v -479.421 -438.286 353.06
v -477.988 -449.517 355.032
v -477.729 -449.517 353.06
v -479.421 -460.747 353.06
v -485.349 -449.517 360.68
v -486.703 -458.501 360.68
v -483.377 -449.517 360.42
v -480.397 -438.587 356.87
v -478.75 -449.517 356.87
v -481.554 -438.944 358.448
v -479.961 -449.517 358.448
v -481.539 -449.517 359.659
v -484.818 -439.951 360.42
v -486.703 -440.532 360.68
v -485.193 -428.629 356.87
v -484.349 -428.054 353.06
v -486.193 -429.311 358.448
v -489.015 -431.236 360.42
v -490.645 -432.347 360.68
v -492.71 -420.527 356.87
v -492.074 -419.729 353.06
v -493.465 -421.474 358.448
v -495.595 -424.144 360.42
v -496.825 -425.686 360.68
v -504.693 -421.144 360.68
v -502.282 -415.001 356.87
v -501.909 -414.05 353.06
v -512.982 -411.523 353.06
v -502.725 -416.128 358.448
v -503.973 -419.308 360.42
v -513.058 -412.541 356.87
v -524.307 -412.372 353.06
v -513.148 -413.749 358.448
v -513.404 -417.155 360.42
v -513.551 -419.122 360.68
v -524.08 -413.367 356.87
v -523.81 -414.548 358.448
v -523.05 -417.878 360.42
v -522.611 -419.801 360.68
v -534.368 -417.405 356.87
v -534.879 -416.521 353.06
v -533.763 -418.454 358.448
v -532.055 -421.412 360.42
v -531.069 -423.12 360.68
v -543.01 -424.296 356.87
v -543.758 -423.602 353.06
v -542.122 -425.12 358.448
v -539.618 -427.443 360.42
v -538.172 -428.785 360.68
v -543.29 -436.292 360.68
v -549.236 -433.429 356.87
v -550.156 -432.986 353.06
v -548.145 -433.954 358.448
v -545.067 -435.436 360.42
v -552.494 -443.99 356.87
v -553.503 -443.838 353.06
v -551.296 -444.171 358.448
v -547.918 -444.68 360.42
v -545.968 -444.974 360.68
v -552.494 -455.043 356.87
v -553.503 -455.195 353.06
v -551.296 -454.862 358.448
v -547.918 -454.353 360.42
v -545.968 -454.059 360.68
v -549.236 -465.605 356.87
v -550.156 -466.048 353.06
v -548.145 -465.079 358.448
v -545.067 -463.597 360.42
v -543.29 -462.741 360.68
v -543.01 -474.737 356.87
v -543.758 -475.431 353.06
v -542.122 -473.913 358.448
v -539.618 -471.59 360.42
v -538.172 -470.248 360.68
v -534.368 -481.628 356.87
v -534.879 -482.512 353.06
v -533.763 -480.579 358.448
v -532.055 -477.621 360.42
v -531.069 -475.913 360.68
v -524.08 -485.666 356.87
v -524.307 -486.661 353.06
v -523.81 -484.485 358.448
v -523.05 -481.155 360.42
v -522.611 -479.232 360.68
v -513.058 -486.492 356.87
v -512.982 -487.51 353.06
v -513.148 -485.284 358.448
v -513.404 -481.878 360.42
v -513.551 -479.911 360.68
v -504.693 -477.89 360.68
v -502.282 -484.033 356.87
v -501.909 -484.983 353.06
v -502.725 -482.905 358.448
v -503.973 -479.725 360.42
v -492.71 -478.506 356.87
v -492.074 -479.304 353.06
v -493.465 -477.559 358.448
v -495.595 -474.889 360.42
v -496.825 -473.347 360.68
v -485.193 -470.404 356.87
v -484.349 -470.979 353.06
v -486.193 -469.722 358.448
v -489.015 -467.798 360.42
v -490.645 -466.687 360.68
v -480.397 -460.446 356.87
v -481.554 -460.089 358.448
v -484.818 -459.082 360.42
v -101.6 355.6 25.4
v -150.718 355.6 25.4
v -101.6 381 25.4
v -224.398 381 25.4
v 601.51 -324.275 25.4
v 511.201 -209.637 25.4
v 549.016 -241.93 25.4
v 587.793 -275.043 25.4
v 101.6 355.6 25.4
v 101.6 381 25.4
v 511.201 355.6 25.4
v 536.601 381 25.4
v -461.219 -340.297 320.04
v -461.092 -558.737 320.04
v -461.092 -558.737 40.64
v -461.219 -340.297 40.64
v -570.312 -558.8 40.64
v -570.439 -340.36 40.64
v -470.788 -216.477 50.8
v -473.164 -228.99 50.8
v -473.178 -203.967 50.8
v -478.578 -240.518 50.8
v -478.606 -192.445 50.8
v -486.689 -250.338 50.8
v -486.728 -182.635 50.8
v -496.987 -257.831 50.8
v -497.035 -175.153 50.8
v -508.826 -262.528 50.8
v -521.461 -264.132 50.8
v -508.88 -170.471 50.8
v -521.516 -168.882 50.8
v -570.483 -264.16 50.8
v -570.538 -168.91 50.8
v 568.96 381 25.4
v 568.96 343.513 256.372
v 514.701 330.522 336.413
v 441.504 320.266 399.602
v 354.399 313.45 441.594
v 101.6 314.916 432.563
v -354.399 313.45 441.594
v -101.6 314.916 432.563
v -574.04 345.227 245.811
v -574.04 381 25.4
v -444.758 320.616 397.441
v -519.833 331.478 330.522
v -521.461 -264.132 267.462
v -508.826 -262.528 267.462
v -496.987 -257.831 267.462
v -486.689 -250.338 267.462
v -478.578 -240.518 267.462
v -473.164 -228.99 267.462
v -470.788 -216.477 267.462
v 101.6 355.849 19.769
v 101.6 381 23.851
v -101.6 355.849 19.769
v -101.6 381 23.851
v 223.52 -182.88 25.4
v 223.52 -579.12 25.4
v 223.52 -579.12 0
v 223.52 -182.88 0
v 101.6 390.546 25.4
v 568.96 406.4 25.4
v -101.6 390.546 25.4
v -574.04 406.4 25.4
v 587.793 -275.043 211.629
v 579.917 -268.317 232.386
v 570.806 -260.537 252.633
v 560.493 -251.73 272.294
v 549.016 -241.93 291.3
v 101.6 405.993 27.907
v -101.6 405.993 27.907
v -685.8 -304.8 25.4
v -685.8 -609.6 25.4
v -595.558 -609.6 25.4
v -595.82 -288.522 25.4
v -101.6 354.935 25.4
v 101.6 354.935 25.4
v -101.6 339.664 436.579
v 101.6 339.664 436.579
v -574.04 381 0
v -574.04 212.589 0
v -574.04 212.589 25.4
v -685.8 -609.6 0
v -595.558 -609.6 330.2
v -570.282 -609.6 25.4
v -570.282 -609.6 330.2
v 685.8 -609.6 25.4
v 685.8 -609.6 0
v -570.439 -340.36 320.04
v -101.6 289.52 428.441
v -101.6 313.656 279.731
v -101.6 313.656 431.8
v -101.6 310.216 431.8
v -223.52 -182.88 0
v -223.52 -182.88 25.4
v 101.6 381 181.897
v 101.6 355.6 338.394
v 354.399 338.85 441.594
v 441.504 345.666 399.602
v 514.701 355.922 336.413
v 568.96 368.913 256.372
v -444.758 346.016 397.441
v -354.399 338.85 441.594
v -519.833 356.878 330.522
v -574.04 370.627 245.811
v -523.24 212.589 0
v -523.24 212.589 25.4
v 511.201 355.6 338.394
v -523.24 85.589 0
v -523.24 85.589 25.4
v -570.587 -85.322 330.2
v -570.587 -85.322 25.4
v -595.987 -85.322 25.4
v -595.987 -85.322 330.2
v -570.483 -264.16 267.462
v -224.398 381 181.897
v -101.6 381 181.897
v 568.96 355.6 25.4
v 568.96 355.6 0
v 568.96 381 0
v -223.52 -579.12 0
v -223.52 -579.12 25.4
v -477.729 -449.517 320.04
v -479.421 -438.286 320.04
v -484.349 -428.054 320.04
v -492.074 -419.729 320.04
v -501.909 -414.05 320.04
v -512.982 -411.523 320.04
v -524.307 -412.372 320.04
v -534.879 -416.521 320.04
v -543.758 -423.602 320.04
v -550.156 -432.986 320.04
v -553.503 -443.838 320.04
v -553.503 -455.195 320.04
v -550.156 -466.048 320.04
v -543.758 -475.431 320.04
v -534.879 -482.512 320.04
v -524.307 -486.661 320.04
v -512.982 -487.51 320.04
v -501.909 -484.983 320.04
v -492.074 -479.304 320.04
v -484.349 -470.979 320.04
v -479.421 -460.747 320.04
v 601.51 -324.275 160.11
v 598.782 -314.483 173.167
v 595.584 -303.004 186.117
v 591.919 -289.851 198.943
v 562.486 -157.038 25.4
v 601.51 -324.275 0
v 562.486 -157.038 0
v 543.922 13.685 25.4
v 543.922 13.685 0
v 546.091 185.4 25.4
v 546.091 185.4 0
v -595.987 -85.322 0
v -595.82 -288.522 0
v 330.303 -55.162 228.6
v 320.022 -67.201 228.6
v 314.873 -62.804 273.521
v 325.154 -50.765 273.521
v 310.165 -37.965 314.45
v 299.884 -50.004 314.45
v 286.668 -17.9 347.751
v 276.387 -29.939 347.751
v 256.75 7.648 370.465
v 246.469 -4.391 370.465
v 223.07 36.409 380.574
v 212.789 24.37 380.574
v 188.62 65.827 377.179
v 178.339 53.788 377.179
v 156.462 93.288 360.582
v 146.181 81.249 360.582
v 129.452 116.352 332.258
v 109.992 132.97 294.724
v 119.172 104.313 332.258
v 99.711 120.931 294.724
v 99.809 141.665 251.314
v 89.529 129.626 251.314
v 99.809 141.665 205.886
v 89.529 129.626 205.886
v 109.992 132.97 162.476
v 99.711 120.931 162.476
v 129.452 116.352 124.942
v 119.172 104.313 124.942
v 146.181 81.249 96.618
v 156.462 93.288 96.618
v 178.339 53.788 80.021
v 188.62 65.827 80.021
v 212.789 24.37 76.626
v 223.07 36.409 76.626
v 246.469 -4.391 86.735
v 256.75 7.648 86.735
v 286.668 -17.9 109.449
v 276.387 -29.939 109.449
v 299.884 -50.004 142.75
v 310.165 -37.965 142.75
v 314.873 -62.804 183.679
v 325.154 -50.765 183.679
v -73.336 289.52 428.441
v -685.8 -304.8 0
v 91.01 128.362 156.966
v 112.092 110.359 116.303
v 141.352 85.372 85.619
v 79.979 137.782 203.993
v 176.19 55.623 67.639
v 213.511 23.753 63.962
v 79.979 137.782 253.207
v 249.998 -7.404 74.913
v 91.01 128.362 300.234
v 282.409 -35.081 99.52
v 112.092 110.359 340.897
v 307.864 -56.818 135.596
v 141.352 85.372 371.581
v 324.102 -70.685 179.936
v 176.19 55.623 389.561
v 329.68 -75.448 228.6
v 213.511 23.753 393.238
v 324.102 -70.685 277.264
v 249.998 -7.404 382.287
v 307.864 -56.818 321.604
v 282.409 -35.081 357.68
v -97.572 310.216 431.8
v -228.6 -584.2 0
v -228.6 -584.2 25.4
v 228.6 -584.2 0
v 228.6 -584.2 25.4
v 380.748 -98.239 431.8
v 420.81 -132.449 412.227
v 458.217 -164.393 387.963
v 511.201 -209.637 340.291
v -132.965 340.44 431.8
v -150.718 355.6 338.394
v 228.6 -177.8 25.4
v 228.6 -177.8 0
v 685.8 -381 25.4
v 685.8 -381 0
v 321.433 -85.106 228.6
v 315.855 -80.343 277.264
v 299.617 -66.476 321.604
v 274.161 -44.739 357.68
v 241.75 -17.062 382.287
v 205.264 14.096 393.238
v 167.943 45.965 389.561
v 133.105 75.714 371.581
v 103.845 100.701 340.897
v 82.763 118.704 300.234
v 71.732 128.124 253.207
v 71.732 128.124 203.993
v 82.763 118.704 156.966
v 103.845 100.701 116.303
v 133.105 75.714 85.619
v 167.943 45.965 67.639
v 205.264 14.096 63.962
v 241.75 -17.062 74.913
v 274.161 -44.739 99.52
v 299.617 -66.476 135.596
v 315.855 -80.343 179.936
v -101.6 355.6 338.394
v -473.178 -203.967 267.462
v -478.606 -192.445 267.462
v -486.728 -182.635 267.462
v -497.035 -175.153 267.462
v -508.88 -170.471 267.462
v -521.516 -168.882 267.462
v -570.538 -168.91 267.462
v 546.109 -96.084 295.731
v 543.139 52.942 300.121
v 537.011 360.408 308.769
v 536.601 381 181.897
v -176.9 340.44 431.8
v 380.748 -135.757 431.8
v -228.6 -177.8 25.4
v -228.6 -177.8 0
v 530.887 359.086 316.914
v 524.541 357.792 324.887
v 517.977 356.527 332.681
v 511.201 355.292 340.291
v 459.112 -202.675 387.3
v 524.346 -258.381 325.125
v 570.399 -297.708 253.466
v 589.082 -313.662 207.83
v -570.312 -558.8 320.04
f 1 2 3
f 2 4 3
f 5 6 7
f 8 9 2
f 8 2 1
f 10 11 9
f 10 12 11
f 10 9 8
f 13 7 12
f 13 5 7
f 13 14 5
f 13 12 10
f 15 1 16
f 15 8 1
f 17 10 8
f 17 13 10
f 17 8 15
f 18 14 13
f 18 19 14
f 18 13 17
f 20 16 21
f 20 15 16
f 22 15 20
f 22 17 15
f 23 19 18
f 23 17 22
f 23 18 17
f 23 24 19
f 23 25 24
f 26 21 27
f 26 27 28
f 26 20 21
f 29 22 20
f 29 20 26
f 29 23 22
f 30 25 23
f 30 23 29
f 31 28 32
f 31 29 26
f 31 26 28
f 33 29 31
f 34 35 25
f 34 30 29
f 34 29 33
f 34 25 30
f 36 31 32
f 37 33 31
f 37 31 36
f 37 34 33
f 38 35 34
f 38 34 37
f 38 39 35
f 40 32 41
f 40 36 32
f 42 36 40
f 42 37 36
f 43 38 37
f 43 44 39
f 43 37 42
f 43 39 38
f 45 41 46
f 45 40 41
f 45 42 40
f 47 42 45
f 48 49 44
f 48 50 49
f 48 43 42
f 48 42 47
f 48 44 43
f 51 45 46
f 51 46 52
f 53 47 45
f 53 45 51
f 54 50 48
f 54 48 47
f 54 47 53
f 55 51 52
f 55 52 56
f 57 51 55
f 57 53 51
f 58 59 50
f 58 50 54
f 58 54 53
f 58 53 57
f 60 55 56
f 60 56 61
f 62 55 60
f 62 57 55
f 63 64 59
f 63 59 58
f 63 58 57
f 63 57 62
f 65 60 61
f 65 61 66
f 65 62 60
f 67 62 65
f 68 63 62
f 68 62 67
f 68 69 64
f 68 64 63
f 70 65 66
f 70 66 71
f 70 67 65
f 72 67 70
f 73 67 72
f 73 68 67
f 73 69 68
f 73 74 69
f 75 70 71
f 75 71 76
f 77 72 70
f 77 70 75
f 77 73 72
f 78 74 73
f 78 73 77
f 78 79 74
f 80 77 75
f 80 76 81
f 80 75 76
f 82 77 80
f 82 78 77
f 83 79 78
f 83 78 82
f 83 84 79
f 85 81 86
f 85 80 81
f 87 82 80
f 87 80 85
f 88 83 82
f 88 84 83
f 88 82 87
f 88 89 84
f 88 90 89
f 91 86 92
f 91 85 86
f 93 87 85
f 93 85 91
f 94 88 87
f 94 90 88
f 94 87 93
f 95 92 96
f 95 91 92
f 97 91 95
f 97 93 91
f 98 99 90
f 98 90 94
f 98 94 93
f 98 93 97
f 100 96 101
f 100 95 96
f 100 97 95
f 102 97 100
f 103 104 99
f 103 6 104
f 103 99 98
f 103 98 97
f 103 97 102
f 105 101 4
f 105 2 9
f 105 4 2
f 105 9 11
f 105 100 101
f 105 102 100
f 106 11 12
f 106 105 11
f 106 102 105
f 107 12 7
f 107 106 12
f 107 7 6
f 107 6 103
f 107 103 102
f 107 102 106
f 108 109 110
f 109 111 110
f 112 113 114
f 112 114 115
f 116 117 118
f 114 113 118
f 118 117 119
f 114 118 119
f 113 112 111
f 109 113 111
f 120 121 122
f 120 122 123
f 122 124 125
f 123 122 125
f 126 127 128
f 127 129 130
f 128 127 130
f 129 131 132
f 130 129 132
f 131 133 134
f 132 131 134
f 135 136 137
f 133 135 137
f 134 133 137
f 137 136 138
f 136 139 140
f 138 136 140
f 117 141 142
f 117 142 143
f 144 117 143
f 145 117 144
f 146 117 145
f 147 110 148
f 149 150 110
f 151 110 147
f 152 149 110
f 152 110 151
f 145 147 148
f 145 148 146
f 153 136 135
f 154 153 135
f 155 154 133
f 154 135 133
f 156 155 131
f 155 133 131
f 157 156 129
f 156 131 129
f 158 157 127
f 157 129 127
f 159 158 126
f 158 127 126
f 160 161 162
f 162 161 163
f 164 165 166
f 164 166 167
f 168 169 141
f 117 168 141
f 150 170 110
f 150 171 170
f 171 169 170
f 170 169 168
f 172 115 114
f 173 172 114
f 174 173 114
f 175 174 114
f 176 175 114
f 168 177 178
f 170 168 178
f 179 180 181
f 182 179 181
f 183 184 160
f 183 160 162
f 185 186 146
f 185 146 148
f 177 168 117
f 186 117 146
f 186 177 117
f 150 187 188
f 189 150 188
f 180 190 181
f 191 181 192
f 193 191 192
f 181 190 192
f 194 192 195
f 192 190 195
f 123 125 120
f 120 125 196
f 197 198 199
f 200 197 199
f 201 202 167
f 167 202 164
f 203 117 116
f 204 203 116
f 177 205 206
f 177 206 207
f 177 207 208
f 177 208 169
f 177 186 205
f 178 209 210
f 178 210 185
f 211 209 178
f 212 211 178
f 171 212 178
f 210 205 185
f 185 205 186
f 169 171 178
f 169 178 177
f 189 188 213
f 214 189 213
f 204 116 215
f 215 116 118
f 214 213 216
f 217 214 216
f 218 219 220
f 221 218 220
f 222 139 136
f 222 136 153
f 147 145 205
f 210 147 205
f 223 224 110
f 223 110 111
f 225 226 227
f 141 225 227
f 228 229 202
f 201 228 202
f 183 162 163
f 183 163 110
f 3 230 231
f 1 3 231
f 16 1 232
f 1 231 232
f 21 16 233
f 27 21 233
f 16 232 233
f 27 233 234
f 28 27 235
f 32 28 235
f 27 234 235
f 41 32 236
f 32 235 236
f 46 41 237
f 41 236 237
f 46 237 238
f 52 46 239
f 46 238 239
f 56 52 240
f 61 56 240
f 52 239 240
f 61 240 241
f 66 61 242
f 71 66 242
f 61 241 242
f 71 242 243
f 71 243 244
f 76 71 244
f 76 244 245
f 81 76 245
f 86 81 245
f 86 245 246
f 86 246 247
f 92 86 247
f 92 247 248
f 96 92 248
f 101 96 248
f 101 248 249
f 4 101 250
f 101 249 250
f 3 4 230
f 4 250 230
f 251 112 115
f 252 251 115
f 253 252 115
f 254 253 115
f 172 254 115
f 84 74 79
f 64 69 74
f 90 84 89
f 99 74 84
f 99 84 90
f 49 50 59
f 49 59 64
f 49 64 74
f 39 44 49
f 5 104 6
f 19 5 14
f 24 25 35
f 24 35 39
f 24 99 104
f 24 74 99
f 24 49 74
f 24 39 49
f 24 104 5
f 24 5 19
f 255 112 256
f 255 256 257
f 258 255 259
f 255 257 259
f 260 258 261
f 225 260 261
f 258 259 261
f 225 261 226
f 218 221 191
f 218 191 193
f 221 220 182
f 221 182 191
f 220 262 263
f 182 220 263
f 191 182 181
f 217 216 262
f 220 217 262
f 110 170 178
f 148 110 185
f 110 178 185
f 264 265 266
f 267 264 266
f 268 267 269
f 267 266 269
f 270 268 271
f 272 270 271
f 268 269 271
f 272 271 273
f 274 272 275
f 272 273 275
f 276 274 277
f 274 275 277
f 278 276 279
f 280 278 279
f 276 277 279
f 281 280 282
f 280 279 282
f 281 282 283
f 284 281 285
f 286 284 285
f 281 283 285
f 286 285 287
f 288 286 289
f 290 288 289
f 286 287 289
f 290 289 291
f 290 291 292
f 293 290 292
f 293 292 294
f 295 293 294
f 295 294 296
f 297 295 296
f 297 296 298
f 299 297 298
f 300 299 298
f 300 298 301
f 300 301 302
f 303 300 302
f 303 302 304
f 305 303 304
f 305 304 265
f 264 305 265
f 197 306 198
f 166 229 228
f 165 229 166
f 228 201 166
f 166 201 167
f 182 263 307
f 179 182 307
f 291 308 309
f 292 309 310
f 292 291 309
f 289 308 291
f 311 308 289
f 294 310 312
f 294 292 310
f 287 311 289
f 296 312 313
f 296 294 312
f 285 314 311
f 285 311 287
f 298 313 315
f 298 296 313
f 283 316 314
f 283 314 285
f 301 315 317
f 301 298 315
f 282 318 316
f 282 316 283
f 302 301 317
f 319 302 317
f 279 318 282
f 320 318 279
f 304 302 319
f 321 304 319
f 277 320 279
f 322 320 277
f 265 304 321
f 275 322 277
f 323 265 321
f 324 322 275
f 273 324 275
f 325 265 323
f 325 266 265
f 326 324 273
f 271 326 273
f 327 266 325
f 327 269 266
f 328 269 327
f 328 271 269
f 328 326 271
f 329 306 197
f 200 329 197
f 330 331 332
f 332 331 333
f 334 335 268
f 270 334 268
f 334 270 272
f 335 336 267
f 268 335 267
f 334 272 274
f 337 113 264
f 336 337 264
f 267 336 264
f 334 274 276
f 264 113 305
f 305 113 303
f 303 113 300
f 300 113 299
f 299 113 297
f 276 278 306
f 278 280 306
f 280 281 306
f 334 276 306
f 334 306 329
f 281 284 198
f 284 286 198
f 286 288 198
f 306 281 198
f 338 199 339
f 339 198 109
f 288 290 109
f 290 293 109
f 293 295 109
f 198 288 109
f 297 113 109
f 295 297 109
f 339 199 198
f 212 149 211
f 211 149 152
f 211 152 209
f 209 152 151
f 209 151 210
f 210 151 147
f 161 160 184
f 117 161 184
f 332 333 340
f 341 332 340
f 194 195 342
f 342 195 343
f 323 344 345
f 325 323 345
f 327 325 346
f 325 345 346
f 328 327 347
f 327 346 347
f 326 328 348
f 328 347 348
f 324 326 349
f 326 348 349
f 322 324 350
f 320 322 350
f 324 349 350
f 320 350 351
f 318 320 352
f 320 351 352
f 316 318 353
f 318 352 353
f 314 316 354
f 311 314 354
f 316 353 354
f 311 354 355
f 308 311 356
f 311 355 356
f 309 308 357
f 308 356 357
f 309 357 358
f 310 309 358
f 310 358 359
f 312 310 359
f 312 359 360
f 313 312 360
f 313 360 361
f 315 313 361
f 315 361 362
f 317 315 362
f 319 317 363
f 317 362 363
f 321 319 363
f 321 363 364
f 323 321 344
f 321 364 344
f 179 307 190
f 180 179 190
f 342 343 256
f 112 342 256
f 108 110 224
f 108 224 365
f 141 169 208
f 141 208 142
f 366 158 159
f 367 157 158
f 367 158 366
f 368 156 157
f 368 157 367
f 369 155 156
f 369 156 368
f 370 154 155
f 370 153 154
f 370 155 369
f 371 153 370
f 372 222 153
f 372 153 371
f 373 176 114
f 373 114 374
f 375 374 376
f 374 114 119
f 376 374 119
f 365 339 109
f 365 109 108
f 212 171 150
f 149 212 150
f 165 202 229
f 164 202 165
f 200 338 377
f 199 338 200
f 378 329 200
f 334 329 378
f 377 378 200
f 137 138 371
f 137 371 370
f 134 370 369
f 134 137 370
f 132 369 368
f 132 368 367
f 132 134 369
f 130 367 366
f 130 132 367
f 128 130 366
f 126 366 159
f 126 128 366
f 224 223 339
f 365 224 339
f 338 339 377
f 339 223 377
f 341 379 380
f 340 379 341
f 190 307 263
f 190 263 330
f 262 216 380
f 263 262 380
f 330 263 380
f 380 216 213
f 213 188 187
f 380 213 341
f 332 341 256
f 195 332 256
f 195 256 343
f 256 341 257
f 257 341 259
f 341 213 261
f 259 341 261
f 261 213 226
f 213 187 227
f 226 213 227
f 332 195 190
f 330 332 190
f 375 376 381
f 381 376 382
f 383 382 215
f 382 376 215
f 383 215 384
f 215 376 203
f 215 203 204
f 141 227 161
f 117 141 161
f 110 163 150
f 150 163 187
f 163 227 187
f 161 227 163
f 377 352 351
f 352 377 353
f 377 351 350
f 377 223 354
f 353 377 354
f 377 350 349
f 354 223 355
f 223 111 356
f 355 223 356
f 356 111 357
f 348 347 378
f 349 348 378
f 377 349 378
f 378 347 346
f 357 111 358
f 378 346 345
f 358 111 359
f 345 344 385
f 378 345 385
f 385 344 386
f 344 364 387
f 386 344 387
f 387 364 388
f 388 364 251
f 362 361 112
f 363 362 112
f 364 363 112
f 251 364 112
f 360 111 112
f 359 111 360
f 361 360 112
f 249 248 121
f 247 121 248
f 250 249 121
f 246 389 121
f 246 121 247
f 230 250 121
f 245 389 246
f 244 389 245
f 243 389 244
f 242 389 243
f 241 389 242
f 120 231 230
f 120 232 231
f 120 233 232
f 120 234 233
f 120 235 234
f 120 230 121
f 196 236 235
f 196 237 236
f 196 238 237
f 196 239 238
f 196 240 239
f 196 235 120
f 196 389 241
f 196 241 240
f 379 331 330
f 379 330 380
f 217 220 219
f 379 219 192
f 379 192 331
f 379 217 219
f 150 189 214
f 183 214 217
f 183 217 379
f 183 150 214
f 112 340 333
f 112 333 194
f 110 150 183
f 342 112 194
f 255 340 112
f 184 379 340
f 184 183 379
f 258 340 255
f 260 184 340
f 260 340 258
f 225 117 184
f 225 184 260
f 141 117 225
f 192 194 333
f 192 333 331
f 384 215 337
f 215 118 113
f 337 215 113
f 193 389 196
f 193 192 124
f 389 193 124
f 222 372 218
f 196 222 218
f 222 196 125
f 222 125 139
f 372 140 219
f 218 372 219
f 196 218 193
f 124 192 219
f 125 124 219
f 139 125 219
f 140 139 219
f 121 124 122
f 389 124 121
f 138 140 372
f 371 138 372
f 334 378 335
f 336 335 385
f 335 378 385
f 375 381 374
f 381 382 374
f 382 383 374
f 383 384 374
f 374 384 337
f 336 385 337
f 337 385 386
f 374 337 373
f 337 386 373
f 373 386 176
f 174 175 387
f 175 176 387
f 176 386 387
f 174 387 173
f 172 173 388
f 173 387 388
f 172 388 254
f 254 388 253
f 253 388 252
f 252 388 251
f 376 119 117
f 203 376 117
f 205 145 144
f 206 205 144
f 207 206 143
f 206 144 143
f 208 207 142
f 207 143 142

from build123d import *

# Parameters (mm, degrees)
F1_DEPTH     = 25.4
F2_W         = 457.2
F2_H         = 406.4
F3_DEPTH     = 25.4
F4_W         = 447.04
F4_H         = 396.24
F5_DEPTH     = 25.4
F7_DEPTH     = 1143
F9_DEPTH     = 406.4
F11_DEPTH    = 1143
F12_R        = 165.1
F13_DEPTH    = 12.7
F14_R        = 152.4
F15_DEPTH    = 25.4
F16_W        = 203.2
F16_H        = 414.02
F17_DEPTH    = 50.8
F19_DEPTH    = 990.6
F21_DEPTH    = 304.8
F22_W        = 218.44
F22_H        = 279.4
F23_DEPTH    = 109.22
F24_R        = 38.1
F25_DEPTH    = 40.64
F26_R        = 7.62
F27_W        = 95.25
F27_H        = 216.662
F28_DEPTH    = 99.822
F29_T1_DEPTH = 343.662


# Not quite as in the source:
# - a fillet or chamfer that OpenCascade refuses, or shapes differently, is made with other operations: its cross-section is extruded or revolved along the edge and cut away or added


with BuildPart() as f1:
    # F0 (on Top) → F1 (new body)
    with BuildSketch(Plane.XY):
        with BuildLine():
            Line((568.96, 381), (-574.04, 381))
            Line((-574.04, 381), (-574.04, 212.5894725323))
            Line((-574.04, 212.5894725323), (-523.24, 212.5894725323))
            Line((-523.24, 212.5894725323), (-523.24, 85.5894725323))
            Line((-523.24, 85.5894725323), (-595.9868865448, -85.3224374884))
            Line((-595.9868865448, -85.3224374884), (-595.8204893284, -288.5223693584))
            Line((-595.8204893284, -288.5223693584), (-685.8, -304.8))
            Line((-685.8, -304.8), (-685.8, -609.6))
            Line((-685.8, -609.6), (685.8, -609.6))
            Line((685.8, -609.6), (685.8, -381))
            Line((685.8, -381), (601.5101489935, -324.2745117491))
            ThreePointArc((601.5101489935, -324.2745117491), (543.9222330335, 13.6848215504), (568.96, 355.6))
            Line((568.96, 355.6), (568.96, 381))
        make_face()
    extrude(amount=F1_DEPTH)

    # F2 (on face) → F3 (cut)
    with BuildSketch(Plane.XY.offset(25.4)):
        with Locations((0, -381)):
            Rectangle(F2_W, F2_H)
    extrude(amount=-F3_DEPTH, mode=Mode.SUBTRACT)


with BuildPart() as f5:
    # F4 (on face) → F5 (new body)
    with BuildSketch(Plane.XY.offset(25.4)):
        with Locations((0, -381)):
            Rectangle(F4_W, F4_H)
    extrude(amount=-F5_DEPTH)


with BuildPart() as f7:
    # F6 (on face) → F7 (new body)
    with BuildSketch(Plane(origin=(-574.04, 0, 0), x_dir=(0, -1, 0), z_dir=(-1, 0, 0))):
        Polygon((-406.4, 25.4), (-381, 25.4), (-313.450360893, 441.593868115), (-338.850360893, 441.593868115), align=None)
    extrude(amount=-F7_DEPTH)


with BuildPart() as f9:
    # F8 (on face) → F9 (new body)
    with BuildSketch(Plane.XY.offset(25.4)):
        Polygon((601.5101489935, -324.2745117491), (587.793108051, -275.0426883363), (549.0162910079, -241.9296818818), (536.6005640478, 381), (511.2005640478, 381), (-180.4623305798, 381), (-224.3979649328, 381), align=None)
        Polygon((511.2005640478, -209.6373869903), (-150.7177903415, 355.6), (511.2005640478, 355.6), align=None, mode=Mode.SUBTRACT)
    extrude(amount=F9_DEPTH)

    # F10 (on face) → F11 (cut)
    with BuildSketch(Plane(origin=(-574.04, 0, 0), x_dir=(0, -1, 0), z_dir=(-1, 0, 0))):
        Polygon((-401.2590646744, 460.1649348316), (-406.4, 25.4), (-335.8362154414, 460.1649348316), align=None)
    extrude(amount=-F11_DEPTH, mode=Mode.SUBTRACT)

    # F12 (on face) → F13 (cut)
    with BuildSketch(Plane(origin=(93.5207792511, 109.5170307696, 0), x_dir=(0.7604594625, -0.6493854063, 0), z_dir=(-0.6493854063, -0.7604594625, 0))):
        with Locations((134.6032201509, 228.6)):
            Circle(F12_R)
    extrude(amount=-F13_DEPTH, mode=Mode.SUBTRACT)

    # F14 (on face) → F15 (cut)
    with BuildSketch(Plane(origin=(101.767973911, 119.1748659433, 0), x_dir=(0.7604594625, -0.6493854063, 0), z_dir=(-0.6493854063, -0.7604594625, 0))):
        with Locations((134.6032201509, 228.6)):
            Circle(F14_R)
    extrude(amount=-F15_DEPTH, mode=Mode.SUBTRACT)


with BuildPart() as f17_tool:
    # F16 (on face) → F17 (new body)
    with BuildSketch(Plane(origin=(0, 399.9859297679, 64.9190371931), x_dir=(-1, 0, 0), z_dir=(0, 0.9870834554, 0.1602069042))):
        with Locations((0, 169.5138338797)):
            Rectangle(F16_W, F16_H)
    extrude(amount=-F17_DEPTH)


with BuildPart() as f1_1:
    add(f1.part)

    # F17: cut by f17_tool
    add(f17_tool.part, mode=Mode.SUBTRACT)

    # F20 (on face) → F21 (join)
    with BuildSketch(Plane.XY.offset(25.4)):
        Polygon((-570.2823618796, -609.6), (-570.5868865448, -85.3224374884), (-595.9868865448, -85.3224374884), (-595.5575639255, -609.6), align=None)
    extrude(amount=F21_DEPTH)

    # F22 (on face) → F23 (join)
    with BuildSketch(Plane(origin=(-570.6362532415, -0.3314519377, 0), x_dir=(-0.0005808462, 0.9999998313, 0), z_dir=(0.9999998313, 0.0005808462, 0))):
        with Locations((-449.2486508406, 180.34)):
            Rectangle(F22_W, F22_H)
    extrude(amount=F23_DEPTH)

    # F24 (on face) → F25 (join)
    with BuildSketch(Plane.XY.offset(320.04)):
        with Locations((-515.8287581144, -449.5165869753)):
            Circle(F24_R)
    extrude(amount=F25_DEPTH)

    # F26
    f26_edges = [f1_1.edges().sort_by_distance(p)[0] for p in [
        (-553.928758, -449.516587, 360.68),
    ]]
    fillet(f26_edges, radius=F26_R)

    # F27 (on face) → F28 (join)
    with BuildSketch(Plane(origin=(-570.6362532415, -0.3314519377, 0), x_dir=(-0.0005808462, 0.9999998313, 0), z_dir=(0.9999998313, 0.0005808462, 0))):
        with Locations((-216.2036508406, 159.131)):
            Rectangle(F27_W, F27_H)
    extrude(amount=F28_DEPTH)

    # F29: fillet of radius 50.8 on 2 edges, made by hand

    # F29_s2 → F29_t1 (cut)
    with BuildSketch(Plane.XY.offset(50.8)):
        with BuildLine():
            ThreePointArc((-521.5163432475, -168.8816000996), (-485.5866824268, -183.7397085159), (-470.6868448316, -219.6520845447))
            Line((-470.6868448316, -219.6520845447), (-470.716351817, -168.8520931142))
            Line((-470.716351817, -168.8520931142), (-521.5163432475, -168.8816000996))
        make_face()
        with BuildLine():
            ThreePointArc((-521.4610176499, -264.1315840318), (-485.5486416211, -249.2317464365), (-470.6905332048, -213.3020856159))
            Line((-470.6905332048, -213.3020856159), (-470.6610262194, -264.1020770464))
            Line((-470.6610262194, -264.1020770464), (-521.4610176499, -264.1315840318))
        make_face()
    extrude(amount=F29_T1_DEPTH, mode=Mode.SUBTRACT)


with BuildPart() as f7_1:
    add(f7.part)

    # F17: cut by f17_tool
    add(f17_tool.part, mode=Mode.SUBTRACT)


with BuildPart() as f9_1:
    add(f9.part)

    # F17: cut by f17_tool
    add(f17_tool.part, mode=Mode.SUBTRACT)


with BuildPart() as f19_tool:
    # F18 (on face) → F19 (new body)
    with BuildSketch(Plane.XZ.offset(609.6)):
        with BuildLine():
            Line((605.9201579013, 445.1687633991), (566.9001340866, 445.1687633991))
            Line((566.9001340866, 445.1687633991), (342.9, 445.1687633991))
            ThreePointArc((342.9, 445.1687633991), (522.2177920978, 327.696172597), (605.9201579013, 130.3421908498))
            Line((605.9201579013, 130.3421908498), (605.9201579013, 235.2843816996))
            Line((605.9201579013, 235.2843816996), (605.9201579013, 445.1687633991))
        make_face()
        with BuildLine():
            Line((-342.9, 445.1687633991), (-566.9001340866, 445.1687633991))
            Line((-566.9001340866, 445.1687633991), (-605.9201579013, 445.1687633991))
            Line((-605.9201579013, 445.1687633991), (-605.9201579013, 235.2843816996))
            Line((-605.9201579013, 235.2843816996), (-605.9201579013, 130.3421908498))
            ThreePointArc((-605.9201579013, 130.3421908498), (-522.2177920978, 327.696172597), (-342.9, 445.1687633991))
        make_face()
    extrude(amount=-F19_DEPTH)


with BuildPart() as f7_2:
    add(f7_1.part)

    # F19: cut by f19_tool
    add(f19_tool.part, mode=Mode.SUBTRACT)


with BuildPart() as f9_2:
    add(f9_1.part)

    # F19: cut by f19_tool
    add(f19_tool.part, mode=Mode.SUBTRACT)


solid = Compound([f5.part, f1_1.part, f7_2.part, f9_2.part])
